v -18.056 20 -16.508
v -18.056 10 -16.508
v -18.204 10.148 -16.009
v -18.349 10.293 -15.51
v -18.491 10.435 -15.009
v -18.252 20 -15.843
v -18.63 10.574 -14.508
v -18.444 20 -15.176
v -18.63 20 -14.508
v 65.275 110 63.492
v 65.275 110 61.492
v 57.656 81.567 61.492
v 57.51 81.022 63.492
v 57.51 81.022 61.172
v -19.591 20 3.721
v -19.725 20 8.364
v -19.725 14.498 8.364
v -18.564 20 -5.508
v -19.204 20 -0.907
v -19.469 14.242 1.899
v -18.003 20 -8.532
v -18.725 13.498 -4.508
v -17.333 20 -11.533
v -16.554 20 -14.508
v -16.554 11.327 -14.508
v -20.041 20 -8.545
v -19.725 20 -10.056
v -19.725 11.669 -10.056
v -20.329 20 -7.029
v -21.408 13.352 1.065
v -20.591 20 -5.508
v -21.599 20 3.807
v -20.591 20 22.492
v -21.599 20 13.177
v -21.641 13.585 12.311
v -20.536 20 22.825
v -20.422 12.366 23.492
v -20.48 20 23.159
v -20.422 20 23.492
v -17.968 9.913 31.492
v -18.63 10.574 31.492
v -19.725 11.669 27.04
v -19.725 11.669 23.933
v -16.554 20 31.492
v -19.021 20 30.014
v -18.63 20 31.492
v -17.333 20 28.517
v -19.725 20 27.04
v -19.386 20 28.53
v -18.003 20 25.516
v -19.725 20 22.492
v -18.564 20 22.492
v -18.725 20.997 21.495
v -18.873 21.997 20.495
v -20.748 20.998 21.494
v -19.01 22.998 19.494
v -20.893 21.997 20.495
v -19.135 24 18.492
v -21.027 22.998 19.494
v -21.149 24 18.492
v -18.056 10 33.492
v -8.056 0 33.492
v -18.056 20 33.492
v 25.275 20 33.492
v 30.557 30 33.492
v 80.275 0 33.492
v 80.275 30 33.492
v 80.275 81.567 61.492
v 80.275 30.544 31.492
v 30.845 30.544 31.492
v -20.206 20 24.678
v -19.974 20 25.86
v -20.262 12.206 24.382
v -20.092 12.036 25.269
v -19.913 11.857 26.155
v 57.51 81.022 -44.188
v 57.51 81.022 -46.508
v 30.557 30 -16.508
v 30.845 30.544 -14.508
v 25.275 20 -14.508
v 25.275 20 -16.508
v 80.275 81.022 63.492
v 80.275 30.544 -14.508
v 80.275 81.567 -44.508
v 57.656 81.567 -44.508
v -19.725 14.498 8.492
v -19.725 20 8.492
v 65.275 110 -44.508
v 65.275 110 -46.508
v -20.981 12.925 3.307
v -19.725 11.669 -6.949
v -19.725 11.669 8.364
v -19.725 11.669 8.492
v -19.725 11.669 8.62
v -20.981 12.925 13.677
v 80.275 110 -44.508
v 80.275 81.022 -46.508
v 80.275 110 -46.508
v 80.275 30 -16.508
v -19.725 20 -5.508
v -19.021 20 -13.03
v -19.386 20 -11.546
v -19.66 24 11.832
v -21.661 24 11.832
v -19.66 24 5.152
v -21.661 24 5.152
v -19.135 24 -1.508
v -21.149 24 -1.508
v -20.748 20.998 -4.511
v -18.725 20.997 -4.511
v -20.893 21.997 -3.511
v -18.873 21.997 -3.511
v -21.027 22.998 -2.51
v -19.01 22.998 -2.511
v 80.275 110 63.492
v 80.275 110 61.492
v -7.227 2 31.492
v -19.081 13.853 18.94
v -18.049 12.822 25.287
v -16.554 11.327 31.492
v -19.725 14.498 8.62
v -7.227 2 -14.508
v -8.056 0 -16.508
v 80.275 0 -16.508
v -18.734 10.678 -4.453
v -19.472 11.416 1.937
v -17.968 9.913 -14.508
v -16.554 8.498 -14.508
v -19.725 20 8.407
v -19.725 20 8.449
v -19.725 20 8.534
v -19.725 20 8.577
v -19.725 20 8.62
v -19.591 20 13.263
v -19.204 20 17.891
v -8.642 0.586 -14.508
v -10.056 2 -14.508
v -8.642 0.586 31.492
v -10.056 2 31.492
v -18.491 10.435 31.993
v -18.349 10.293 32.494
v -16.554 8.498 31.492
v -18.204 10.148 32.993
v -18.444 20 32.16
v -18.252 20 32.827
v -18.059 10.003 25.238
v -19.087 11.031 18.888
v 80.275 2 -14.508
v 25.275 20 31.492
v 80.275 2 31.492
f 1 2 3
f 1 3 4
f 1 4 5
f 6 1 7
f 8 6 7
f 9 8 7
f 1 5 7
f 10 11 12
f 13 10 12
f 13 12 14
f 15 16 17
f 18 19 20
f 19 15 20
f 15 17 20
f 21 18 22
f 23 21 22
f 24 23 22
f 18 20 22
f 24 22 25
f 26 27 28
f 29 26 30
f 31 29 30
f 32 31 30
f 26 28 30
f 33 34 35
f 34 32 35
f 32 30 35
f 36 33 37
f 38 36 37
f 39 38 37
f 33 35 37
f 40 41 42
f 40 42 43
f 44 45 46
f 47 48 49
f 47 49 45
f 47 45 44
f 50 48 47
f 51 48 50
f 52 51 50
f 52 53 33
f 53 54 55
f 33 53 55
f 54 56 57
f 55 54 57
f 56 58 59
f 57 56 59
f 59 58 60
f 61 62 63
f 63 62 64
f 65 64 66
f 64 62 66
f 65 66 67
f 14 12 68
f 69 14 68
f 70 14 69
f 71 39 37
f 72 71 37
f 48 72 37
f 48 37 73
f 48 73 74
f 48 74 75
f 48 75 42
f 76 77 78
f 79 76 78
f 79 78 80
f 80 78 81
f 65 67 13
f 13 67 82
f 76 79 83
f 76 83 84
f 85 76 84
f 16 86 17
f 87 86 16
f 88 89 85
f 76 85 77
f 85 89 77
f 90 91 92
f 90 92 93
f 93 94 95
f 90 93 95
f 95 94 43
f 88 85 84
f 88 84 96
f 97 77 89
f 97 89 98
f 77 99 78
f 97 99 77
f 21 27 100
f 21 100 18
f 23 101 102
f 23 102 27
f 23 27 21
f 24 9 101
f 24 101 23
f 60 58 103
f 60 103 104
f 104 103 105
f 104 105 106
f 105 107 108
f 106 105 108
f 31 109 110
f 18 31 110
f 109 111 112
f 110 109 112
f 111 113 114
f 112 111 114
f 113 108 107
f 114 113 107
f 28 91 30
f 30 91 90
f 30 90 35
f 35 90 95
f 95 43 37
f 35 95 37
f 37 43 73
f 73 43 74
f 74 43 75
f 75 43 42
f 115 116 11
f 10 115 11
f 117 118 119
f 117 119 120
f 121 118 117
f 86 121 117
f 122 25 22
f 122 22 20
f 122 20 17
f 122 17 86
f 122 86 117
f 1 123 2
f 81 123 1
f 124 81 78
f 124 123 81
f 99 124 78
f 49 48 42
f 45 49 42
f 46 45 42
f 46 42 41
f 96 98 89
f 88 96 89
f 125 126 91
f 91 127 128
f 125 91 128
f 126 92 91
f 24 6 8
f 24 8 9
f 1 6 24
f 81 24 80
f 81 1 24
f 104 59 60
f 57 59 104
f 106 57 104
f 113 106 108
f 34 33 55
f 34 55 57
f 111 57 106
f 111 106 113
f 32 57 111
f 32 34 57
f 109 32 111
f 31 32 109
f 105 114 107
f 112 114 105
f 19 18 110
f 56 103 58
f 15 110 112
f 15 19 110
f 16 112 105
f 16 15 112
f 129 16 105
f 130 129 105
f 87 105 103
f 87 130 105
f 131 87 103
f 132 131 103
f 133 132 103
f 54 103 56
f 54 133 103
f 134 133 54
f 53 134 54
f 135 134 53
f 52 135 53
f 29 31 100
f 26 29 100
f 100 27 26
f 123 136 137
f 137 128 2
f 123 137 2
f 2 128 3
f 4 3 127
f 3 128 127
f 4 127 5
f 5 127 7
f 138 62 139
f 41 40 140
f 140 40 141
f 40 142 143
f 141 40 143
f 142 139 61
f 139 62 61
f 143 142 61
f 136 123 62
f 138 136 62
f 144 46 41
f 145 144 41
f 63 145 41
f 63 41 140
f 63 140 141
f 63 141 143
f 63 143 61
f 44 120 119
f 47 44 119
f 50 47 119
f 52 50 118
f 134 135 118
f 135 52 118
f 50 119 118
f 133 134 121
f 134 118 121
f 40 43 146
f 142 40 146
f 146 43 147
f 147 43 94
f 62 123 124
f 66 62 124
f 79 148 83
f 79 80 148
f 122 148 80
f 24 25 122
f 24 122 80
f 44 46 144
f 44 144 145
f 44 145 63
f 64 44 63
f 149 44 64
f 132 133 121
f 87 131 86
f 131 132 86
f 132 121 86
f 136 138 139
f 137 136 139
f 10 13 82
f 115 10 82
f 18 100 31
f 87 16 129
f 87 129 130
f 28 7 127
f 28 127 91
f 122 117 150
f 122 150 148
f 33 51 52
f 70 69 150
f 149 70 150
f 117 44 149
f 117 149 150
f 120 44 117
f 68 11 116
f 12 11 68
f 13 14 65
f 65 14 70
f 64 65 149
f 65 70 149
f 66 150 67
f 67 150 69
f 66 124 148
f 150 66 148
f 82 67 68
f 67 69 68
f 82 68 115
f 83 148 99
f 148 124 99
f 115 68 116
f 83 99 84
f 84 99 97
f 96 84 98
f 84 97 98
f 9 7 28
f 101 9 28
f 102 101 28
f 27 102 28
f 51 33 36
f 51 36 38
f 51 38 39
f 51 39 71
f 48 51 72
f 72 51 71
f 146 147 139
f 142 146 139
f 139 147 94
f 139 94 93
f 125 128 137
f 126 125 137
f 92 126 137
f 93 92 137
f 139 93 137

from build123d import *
from build123d.topology import SkipClean

# Parameters (mm, degrees)
BOSS_EXTRUDE1_DEPTH      = 20
CUT_EXTRUDE1_DEPTH       = 60.487961127
BOSS_EXTRUDE2_DEPTH      = 4
CHAMFER1_SIZE            = 4
BOSS_EXTRUDE3_DEPTH      = 30
BOSS_EXTRUDE3_DEPTH_BACK = 80
CUT_EXTRUDE2_DEPTH       = 163.896367878
SHELL1_START             = -17.663350197
SHELL1_DEPTH             = 97.938189841
SHELL1_START_2           = -19.725064534
SHELL1_2_OUTLINE_W       = 18
SHELL1_2_OUTLINE_H       = 46
SHELL1_2_DEPTH           = 3.170813997
SHELL1_START_3           = 4.138253986
SHELL1_3_DEPTH           = 15.861746014
SHELL1_START_4           = -11.021607192
SHELL1_4_DEPTH           = 5.325277307
SHELL1_START_5           = -5.696329885
SHELL1_5_DEPTH           = 2


with BuildPart() as part:
    # Sketch1 → Boss-Extrude1 (new body)
    with BuildSketch(Plane(origin=(0, 0, 0), x_dir=(1, 0, 0), z_dir=(0, 1, 0))):
        with BuildLine():
            Line((25.274839644, -23.491941756), (25.274839644, 16.508058244))
            Line((25.274839644, 16.508058244), (-18.05582698, 16.508058244))
            ThreePointArc((-18.05582698, 16.508058244), (-21.573303396, -3.353843819), (-20.422301498, -23.491941756))
            ThreePointArc((-20.422301498, -23.491941756), (-19.386839701, -28.526912443), (-18.05582698, -33.491941756))
            Line((-18.05582698, -33.491941756), (25.274839644, -33.491941756))
            Line((25.274839644, -33.491941756), (25.274839644, -23.491941756))
        make_face()
    extrude(amount=BOSS_EXTRUDE1_DEPTH)

    # Sketch2 → Cut-Extrude1 (cut, through all)
    with BuildSketch(Plane.XY.offset(33.491941756)):
        Polygon((-18.05582698, 10), (-18.05582698, 0), (-8.05582698, 0), align=None)
        Polygon((-8.05582698, 0), (-18.05582698, 0), (-18.05582698, 10), (-26.022793605, 17.966966625), (-26.022793605, -4.913514026), (-8.05582698, -4.913514026), align=None)
    extrude(amount=-CUT_EXTRUDE1_DEPTH, mode=Mode.SUBTRACT)

    # Sketch3 → Boss-Extrude2 (add)
    with BuildSketch(Plane(origin=(0, 20, 0), x_dir=(1, 0, 0), z_dir=(0, 1, 0))):
        with BuildLine():
            Line((-20.591335302, 5.508058244), (-18.56429203, 5.508058244))
            ThreePointArc((-18.56429203, 5.508058244), (-19.725160356, -8.491941756), (-18.56429203, -22.491941756))
            Line((-18.56429203, -22.491941756), (-20.591335302, -22.491941756))
            ThreePointArc((-20.591335302, -22.491941756), (-21.725160356, -8.491941756), (-20.591335302, 5.508058244))
        make_face()
    extrude(amount=BOSS_EXTRUDE2_DEPTH)

    # Chamfer1
    chamfer1_edges = [part.edges().sort_by_distance(p)[0] for p in [
        (-19.577813666, 24, -5.508058244),
        (-19.577813666, 24, 22.491941756),
    ]]
    chamfer(chamfer1_edges, length=CHAMFER1_SIZE - 0.0001)  # a hair under: the kernel refuses the full size

    # Sketch4 → Boss-Extrude3 (add, two sides: drawn at the far end of the back side and taken through both)
    with BuildSketch(Plane.XY.offset(33.491941756).offset(-BOSS_EXTRUDE3_DEPTH_BACK)):
        Polygon((65.274839644, 110), (57.510268291, 81.022225211), (25.274839644, 20), (25.274839644, 0), (80.274839644, 0), (80.274839644, 110), align=None)
    extrude(amount=BOSS_EXTRUDE3_DEPTH + BOSS_EXTRUDE3_DEPTH_BACK)

    # Sketch5 → Cut-Extrude2 (cut, through all)
    with BuildSketch(Plane(origin=(80.274839644, 0, 0), x_dir=(0, 0, -1), z_dir=(1, 0, 0))):
        Polygon((-63.491941756, 0), (-33.491941756, 0), (-33.491941756, 30), (-63.491941756, 81.022225211), align=None)
    cut_extrude2 = extrude(amount=-CUT_EXTRUDE2_DEPTH, mode=Mode.SUBTRACT)

    # Mirror1: Cut-Extrude2 across plane
    add(cut_extrude2.mirror(Plane.XY.offset(8.491941756)), mode=Mode.SUBTRACT)

    # Shell1: read off the stored shape, not the designer's step
    # Shell1 outline → Shell1 (cut)
    with BuildSketch(Plane.YZ.offset(SHELL1_START)):
        Polygon((2, 31.491941756), (2, -14.508058244), (30.544412087, -14.508058244), (81.566637298, -44.508058244), (110, -44.508058244), (110, 61.491941756), (81.566637298, 61.491941756), (30.544412087, 31.491941756), align=None)
    extrude(amount=SHELL1_DEPTH, mode=Mode.SUBTRACT)

    # Shell1 2 outline → Shell1 2 (cut)
    with BuildSketch(Plane.YZ.offset(SHELL1_START_2)):
        with Locations((11, 8.491941756)):
            Rectangle(SHELL1_2_OUTLINE_W, SHELL1_2_OUTLINE_H)
    extrude(amount=SHELL1_2_DEPTH, mode=Mode.SUBTRACT)

    # Shell1 3 outline → Shell1 3 (add)
    with SkipClean():  # the faces are left unmerged after this step: merging them gives an invalid solid
        with BuildSketch(Plane(origin=(0, 0, 0), x_dir=(1, 0, 0), z_dir=(0, 1, 0)).offset(SHELL1_START_3)):
            with BuildLine():
                ThreePointArc((-19.725064534, -27.039617882), (-19.20680208, -29.272995907), (-18.62986821, -31.491941756))
                Line((-18.62986821, -31.491941756), (-16.554250537, -31.491941756))
                ThreePointArc((-16.554250537, -31.491941756), (-18.92870145, -20.100717198), (-19.725160356, -8.491941756))
                Line((-19.725160356, -8.491941756), (-19.725064534, -27.039617882))
            make_face()
            with BuildLine():
                ThreePointArc((-18.62986821, 14.508058244), (-19.20680208, 12.289112394), (-19.725064535, 10.055734369))
                Line((-19.725064535, 10.055734369), (-19.725160356, -8.491941756))
                ThreePointArc((-19.725160356, -8.491941756), (-18.92870145, 3.116833686), (-16.554250537, 14.508058244))
                Line((-16.554250537, 14.508058244), (-18.62986821, 14.508058244))
            make_face()
        extrude(amount=SHELL1_3_DEPTH)

    # Shell1 4 outline → Shell1 4 (cut)
    with SkipClean():  # the faces are left unmerged after this step: merging them gives an invalid solid
        with BuildSketch(Plane(origin=(0, 0, 0), x_dir=(0.7071067811865509, -0.707106781186544, 0), z_dir=(0.707106781186544, 0.707106781186551, 0)).offset(SHELL1_START_4)):
            with BuildLine():
                Line((-5.696329885, 16.508058244), (-19.838465509, 16.508058244))
                add(Edge.make_bspline(
                    [(-19.838465509, 16.508058244), (-30.445406654, -8.491941756), (-19.838465509, -33.491941756)],
                    knots=[2.850127051, 2.850127051, 2.850127051, 3.433058256, 3.433058256, 3.433058256], degree=2, weights=[1, 0.957823754, 1]))
                Line((-19.838465509, -33.491941756), (-5.696329885, -33.491941756))
                Line((-5.696329885, -33.491941756), (-5.696329885, 16.508058244))
            make_face()
        extrude(amount=SHELL1_4_DEPTH, mode=Mode.SUBTRACT)

    # Shell1 5 outline → Shell1 5 (add)
    with SkipClean():  # the faces are left unmerged after this step: merging them gives an invalid solid
        with BuildSketch(Plane(origin=(0, 0, 0), x_dir=(0.7071067811865509, -0.707106781186544, 0), z_dir=(0.707106781186544, 0.707106781186551, 0)).offset(SHELL1_START_5)):
            with BuildLine():
                Line((-6.52475701, -31.491941756), (-6.52475701, 14.508058244))
                Line((-6.52475701, 14.508058244), (-19.71491574, 14.508058244))
                add(Edge.make_bspline(
                    [(-19.71491574, 14.508058244), (-28.857373182, -8.491941756), (-19.71491574, -31.491941756)],
                    knots=[2.867588645, 2.867588645, 2.867588645, 3.415596662, 3.415596662, 3.415596662], degree=2, weights=[1, 0.962695179, 1]))
                Line((-19.71491574, -31.491941756), (-6.52475701, -31.491941756))
            make_face()
        extrude(amount=SHELL1_5_DEPTH)


solid = part.part
